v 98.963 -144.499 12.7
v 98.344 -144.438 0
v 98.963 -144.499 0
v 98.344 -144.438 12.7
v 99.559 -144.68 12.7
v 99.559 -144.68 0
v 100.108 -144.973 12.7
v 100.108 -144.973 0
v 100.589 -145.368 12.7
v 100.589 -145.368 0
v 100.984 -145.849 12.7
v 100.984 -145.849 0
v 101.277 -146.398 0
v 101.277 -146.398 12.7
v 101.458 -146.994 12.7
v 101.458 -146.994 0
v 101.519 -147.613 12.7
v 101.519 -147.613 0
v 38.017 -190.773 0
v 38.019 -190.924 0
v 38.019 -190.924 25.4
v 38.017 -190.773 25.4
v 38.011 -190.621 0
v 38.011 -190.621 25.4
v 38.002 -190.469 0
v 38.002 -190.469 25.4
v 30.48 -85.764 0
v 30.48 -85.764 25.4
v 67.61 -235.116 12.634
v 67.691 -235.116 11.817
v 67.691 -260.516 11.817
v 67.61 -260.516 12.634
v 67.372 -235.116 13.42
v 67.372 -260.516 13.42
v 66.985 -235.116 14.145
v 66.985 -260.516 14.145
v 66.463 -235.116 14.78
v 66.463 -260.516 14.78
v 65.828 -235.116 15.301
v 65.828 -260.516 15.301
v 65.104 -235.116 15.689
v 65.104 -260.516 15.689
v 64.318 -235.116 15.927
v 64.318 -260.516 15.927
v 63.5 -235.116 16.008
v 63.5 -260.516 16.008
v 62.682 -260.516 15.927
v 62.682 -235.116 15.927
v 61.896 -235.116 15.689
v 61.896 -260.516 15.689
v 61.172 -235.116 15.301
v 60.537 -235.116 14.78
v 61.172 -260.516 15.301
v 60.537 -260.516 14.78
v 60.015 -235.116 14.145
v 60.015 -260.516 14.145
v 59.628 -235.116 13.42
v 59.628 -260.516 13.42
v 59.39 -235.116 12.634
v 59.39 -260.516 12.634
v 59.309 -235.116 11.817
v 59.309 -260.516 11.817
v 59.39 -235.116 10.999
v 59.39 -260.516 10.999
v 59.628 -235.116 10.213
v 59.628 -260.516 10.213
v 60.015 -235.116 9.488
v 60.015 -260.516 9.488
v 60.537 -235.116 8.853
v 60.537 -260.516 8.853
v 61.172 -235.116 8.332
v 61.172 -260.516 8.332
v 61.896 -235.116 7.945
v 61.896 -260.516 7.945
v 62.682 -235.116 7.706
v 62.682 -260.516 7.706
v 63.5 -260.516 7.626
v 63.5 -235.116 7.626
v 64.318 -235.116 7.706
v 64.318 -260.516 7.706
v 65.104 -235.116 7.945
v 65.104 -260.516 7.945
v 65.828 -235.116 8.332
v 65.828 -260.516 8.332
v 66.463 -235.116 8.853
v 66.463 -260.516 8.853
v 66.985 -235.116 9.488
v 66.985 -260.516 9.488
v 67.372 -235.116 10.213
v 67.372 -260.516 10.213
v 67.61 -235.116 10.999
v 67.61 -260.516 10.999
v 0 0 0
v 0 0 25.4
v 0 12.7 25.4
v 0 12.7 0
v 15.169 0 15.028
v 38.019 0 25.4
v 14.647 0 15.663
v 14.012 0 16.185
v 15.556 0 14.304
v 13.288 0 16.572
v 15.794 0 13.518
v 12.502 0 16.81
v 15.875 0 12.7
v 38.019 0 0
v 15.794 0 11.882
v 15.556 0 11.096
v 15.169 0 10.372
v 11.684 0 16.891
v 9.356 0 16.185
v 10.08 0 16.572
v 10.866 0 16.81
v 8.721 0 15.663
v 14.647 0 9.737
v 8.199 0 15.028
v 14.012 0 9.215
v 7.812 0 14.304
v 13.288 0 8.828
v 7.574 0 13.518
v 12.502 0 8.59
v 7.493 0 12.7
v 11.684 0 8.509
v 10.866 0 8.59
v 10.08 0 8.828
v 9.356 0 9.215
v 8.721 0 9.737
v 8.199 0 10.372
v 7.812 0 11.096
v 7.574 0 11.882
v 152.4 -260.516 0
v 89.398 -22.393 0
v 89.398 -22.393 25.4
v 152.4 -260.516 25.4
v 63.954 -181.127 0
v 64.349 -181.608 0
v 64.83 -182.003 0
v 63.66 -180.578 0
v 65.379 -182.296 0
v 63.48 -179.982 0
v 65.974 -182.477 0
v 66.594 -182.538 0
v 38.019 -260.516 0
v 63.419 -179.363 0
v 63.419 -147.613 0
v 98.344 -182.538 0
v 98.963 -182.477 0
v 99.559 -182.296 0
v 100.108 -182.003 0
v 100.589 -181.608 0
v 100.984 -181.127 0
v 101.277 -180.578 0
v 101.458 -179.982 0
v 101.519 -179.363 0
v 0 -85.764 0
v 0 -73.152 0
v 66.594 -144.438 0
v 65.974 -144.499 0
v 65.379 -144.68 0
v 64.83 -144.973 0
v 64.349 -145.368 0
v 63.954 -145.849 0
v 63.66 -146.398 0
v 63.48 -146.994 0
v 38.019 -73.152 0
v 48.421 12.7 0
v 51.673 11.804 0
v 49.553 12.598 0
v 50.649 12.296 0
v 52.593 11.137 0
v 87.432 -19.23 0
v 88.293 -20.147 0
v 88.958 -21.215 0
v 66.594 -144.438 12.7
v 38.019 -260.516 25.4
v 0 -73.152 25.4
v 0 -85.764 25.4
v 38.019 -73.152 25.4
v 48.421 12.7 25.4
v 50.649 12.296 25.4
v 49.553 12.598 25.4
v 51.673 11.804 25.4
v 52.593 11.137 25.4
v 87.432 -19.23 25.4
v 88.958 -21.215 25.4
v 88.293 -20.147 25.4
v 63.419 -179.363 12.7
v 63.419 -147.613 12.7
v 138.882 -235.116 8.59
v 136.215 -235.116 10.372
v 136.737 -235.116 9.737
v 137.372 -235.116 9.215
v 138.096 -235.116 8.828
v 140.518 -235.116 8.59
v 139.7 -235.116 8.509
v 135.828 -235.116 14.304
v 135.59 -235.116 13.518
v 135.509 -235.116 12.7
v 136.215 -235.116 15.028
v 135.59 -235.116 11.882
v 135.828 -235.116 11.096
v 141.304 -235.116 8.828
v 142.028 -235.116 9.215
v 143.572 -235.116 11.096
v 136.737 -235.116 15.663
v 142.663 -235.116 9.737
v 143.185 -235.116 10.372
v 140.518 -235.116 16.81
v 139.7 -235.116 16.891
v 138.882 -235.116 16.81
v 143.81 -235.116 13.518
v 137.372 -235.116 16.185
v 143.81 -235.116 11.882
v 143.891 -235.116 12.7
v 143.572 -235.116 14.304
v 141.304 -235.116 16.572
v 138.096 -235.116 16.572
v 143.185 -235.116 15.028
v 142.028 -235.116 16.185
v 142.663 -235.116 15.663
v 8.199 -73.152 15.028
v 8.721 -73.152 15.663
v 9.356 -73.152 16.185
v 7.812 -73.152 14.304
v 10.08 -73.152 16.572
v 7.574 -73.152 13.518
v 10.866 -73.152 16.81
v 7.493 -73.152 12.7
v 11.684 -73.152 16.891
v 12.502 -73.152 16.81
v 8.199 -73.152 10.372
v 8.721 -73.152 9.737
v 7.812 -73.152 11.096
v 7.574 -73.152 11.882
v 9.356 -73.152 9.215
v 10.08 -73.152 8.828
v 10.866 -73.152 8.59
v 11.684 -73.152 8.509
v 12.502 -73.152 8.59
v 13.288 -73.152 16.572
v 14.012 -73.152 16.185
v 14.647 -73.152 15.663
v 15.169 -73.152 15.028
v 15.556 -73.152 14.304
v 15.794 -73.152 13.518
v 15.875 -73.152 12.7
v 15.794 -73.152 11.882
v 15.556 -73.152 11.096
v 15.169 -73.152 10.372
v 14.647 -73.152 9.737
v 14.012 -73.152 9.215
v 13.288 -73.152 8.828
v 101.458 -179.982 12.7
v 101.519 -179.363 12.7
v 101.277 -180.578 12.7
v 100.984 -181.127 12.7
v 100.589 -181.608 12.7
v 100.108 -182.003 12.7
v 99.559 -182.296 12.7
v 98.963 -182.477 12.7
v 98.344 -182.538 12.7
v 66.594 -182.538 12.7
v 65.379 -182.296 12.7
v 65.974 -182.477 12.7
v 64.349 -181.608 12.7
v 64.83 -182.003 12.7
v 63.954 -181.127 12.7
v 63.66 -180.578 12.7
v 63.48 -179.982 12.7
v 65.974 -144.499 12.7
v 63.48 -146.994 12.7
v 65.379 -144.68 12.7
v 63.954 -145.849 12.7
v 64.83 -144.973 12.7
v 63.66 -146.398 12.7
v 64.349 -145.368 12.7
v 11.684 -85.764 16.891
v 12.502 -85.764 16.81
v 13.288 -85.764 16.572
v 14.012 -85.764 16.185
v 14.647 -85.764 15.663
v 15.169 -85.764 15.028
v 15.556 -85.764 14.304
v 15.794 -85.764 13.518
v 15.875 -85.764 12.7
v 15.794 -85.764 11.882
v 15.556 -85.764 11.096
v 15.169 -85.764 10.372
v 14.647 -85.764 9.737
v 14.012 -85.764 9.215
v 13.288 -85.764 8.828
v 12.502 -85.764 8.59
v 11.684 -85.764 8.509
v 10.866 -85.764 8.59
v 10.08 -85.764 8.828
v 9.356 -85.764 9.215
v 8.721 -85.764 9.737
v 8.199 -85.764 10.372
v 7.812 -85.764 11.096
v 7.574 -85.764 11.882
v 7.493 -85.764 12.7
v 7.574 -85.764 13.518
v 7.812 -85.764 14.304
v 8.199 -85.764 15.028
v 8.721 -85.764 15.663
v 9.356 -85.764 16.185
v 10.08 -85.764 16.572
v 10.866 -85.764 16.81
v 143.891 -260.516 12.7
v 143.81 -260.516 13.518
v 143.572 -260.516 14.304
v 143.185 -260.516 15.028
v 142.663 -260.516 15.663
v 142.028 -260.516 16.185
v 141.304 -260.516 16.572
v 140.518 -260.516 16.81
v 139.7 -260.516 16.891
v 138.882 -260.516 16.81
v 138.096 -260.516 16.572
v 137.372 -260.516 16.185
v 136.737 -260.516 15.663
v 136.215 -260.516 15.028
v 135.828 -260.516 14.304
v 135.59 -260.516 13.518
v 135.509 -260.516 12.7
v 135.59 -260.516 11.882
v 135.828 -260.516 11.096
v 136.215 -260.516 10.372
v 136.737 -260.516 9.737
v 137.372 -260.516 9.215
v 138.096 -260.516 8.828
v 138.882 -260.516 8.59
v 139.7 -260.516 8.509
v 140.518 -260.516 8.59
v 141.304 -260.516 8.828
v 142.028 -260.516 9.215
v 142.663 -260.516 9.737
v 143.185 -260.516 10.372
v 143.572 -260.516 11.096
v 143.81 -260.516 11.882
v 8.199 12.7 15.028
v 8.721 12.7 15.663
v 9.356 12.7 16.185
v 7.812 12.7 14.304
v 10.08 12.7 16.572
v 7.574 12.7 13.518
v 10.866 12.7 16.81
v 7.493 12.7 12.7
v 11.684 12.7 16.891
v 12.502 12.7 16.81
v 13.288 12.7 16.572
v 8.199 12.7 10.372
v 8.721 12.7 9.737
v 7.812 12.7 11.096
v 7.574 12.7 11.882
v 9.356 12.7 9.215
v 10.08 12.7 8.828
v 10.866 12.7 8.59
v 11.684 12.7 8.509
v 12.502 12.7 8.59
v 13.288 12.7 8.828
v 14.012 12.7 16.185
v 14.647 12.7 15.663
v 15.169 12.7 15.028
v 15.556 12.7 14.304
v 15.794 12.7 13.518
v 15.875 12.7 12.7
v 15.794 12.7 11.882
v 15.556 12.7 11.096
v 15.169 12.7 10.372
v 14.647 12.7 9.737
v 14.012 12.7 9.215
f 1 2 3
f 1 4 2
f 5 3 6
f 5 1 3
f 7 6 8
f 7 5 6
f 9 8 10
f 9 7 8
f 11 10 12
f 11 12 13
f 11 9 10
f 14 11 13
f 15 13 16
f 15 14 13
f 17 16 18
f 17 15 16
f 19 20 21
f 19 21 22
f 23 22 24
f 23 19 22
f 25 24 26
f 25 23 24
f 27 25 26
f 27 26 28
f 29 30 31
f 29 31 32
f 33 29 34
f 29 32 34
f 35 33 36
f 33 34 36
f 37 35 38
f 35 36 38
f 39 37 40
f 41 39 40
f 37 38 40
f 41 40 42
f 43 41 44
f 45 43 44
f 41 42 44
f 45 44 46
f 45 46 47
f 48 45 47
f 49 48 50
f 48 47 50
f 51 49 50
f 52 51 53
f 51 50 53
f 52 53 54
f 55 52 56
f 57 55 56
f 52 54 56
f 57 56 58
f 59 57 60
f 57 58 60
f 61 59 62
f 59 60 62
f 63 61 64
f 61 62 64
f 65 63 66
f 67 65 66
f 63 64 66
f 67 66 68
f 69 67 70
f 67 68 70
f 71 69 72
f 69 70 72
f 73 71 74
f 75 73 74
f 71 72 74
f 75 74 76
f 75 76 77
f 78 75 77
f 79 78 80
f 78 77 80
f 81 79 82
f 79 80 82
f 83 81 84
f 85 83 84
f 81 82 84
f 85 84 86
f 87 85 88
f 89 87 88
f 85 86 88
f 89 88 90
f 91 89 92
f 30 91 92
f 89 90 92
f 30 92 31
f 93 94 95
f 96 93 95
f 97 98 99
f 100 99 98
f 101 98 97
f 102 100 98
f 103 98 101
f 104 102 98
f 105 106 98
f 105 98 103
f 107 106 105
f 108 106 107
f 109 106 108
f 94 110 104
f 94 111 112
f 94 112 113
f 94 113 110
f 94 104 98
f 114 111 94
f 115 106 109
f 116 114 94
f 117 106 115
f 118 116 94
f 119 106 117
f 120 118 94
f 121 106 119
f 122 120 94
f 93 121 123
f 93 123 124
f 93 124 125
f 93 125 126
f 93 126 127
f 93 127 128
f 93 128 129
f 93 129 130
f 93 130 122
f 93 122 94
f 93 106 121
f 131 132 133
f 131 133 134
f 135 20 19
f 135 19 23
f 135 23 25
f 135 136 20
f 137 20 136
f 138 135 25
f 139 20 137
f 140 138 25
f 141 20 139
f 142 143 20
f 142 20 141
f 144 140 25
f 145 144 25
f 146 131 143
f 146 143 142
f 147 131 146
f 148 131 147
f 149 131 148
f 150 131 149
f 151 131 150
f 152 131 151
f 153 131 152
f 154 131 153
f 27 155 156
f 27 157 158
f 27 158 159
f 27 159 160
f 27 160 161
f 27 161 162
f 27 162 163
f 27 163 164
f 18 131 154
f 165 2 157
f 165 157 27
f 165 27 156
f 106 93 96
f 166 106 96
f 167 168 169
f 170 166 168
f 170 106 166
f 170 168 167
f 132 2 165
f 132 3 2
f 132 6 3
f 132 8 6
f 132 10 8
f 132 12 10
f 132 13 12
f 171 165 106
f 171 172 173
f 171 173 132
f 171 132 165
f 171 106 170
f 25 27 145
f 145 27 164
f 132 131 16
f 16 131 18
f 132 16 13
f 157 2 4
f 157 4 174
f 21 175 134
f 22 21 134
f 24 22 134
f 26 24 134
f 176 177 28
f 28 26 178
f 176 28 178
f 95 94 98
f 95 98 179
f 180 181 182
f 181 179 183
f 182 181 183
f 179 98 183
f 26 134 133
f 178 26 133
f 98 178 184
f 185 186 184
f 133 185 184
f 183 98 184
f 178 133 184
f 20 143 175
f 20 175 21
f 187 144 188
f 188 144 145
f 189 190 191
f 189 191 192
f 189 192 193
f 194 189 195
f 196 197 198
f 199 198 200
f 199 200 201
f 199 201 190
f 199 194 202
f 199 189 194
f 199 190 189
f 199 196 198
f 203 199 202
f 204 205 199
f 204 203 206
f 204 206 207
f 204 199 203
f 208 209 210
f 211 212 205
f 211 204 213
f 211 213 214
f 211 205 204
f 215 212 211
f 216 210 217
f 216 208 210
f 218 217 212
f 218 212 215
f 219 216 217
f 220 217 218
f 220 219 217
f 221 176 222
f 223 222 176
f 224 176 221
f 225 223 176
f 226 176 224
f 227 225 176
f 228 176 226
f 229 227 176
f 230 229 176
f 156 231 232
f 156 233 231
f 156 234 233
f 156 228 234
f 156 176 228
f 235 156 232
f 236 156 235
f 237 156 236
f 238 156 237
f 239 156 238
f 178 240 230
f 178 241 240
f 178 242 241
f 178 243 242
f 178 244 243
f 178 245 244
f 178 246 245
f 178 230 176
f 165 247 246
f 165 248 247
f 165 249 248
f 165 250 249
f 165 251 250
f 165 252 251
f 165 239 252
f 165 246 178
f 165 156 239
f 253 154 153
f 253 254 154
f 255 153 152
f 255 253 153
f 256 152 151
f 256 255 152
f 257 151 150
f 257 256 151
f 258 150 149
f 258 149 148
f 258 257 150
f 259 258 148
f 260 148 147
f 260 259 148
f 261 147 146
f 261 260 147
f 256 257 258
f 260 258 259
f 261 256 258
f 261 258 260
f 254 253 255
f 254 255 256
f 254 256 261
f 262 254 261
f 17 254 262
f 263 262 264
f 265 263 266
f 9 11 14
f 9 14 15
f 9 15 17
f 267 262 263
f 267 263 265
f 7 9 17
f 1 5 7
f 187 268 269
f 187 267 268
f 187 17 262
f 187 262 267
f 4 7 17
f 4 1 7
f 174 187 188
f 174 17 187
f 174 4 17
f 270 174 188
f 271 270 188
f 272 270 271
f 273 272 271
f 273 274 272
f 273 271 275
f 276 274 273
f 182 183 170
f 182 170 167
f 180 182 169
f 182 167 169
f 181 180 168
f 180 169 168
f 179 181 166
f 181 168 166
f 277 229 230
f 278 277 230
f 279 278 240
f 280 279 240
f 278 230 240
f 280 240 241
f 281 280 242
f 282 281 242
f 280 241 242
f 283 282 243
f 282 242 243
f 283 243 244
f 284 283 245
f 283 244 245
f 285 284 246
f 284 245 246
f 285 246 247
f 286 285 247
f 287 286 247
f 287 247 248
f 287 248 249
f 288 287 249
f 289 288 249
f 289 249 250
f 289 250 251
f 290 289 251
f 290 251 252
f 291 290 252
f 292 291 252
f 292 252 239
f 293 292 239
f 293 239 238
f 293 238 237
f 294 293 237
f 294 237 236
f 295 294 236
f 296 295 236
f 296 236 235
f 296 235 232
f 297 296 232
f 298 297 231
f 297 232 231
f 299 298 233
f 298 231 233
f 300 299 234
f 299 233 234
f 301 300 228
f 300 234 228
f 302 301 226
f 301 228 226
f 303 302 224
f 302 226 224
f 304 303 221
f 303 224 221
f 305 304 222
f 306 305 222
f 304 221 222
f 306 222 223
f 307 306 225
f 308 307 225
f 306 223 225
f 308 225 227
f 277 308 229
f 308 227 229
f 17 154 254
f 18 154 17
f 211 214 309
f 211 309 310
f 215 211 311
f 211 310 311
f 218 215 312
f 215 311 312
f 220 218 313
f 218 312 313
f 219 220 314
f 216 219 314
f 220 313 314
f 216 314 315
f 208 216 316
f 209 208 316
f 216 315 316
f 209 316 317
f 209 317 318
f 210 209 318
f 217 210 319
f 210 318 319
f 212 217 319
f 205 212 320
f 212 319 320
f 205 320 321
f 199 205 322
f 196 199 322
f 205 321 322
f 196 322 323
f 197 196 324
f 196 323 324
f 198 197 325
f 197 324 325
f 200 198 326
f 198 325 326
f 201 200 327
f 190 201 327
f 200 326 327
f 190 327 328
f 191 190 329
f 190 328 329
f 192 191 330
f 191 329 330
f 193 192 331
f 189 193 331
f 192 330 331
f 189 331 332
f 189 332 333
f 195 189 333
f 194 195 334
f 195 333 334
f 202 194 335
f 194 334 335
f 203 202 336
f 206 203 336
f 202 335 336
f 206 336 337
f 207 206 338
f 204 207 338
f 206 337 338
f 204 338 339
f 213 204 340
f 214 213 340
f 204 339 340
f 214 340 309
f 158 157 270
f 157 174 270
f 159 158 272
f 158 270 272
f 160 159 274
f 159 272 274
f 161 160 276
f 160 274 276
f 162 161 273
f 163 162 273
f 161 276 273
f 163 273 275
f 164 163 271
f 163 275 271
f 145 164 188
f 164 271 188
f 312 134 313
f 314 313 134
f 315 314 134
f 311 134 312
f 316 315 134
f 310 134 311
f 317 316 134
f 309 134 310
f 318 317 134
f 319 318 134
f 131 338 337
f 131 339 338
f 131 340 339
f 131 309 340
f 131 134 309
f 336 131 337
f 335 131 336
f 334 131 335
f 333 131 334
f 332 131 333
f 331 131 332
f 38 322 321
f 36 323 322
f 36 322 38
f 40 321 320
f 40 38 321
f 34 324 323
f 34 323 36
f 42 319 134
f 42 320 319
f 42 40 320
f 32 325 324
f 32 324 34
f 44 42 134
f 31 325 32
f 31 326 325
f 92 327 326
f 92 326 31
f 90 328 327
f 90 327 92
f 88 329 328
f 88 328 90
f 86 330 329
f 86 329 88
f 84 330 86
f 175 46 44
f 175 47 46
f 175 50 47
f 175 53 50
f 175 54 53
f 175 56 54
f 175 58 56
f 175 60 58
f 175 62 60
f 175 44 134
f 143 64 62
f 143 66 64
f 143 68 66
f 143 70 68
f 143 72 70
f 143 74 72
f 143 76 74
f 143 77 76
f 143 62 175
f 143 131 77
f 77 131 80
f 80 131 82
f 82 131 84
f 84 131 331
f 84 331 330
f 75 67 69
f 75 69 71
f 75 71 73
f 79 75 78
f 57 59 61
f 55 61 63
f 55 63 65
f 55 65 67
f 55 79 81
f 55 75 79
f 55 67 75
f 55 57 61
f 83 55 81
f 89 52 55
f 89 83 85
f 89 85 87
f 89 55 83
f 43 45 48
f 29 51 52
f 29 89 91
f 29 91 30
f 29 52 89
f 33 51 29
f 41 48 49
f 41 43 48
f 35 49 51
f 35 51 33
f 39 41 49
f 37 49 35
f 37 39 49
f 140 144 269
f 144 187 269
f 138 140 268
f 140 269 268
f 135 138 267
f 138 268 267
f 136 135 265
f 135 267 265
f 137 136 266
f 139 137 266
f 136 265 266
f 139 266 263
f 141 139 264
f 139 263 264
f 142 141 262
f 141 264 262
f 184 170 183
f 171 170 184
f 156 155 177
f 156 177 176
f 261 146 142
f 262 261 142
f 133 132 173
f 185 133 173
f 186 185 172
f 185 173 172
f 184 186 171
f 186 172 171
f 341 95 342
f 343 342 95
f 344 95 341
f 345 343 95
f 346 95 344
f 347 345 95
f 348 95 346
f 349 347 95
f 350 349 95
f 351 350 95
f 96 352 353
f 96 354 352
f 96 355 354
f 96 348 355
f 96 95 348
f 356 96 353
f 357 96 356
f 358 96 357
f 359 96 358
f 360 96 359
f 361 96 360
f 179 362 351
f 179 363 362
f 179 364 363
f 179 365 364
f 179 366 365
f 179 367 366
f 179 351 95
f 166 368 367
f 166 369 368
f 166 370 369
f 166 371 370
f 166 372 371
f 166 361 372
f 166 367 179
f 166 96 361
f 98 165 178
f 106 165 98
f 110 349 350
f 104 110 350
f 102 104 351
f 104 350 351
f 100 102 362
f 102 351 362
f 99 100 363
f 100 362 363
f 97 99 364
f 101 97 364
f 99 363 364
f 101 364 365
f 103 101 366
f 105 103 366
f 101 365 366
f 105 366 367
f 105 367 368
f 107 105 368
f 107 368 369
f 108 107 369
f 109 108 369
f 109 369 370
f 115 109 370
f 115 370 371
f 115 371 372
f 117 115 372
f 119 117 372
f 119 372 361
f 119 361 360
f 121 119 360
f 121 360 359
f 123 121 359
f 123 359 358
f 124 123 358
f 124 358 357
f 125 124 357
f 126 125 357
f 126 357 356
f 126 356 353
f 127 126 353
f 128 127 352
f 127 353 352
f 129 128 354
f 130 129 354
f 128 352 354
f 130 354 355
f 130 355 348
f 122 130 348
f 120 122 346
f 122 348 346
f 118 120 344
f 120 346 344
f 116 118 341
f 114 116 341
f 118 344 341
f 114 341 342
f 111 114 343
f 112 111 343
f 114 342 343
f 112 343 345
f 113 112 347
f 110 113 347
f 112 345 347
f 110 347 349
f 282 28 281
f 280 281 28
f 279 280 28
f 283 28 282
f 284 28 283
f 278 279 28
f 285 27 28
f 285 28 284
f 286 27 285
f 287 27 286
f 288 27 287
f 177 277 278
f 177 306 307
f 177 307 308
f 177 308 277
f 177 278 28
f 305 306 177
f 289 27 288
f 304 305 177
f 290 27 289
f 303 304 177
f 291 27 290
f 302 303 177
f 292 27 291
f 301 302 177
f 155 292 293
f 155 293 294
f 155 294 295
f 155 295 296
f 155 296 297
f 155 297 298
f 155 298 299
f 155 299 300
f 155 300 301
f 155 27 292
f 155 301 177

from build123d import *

# Parameters (mm, degrees)
BOSS_EXTRUDE1_DEPTH = 25.4
SKETCH2_W           = 38.1
SKETCH2_H           = 38.1
CUT_EXTRUDE1_DEPTH  = 12.7
SKETCH3_R           = 4.191
CUT_EXTRUDE2_DEPTH  = 314.875552812
SKETCH4_R           = 4.191
CUT_EXTRUDE3_DEPTH  = 25.4
FILLET1_R           = 6.35
FILLET2_R           = 3.175


with BuildPart() as part:
    # Sketch1 → Boss-Extrude1 (new body)
    with BuildSketch(Plane.XY):
        Polygon((0, 0), (0, 12.7), (50.8, 12.7), (88.9, -20.510228633), (152.4, -260.515926793), (38.018659419, -260.515926793), (38.018659419, -190.696503564), (30.48, -85.763926793), (0, -85.763926793), (0, -73.152260366), (38.018659419, -73.152260366), (38.018659419, 0), align=None)
    extrude(amount=BOSS_EXTRUDE1_DEPTH)

    # Sketch2 → Cut-Extrude1 (cut)
    with BuildSketch(Plane(origin=(0, 0, 0), x_dir=(-1, 0, 0), z_dir=(0, 0, -1))):
        with Locations((-82.468659419, -163.487926793)):
            Rectangle(SKETCH2_W, SKETCH2_H)
    extrude(amount=-CUT_EXTRUDE1_DEPTH, mode=Mode.SUBTRACT)

    # Sketch3 → Cut-Extrude2 (cut, through all)
    with BuildSketch(Plane(origin=(0, 12.7, 0), x_dir=(1, 0, 0), z_dir=(0, 1, 0))):
        with Locations(Location((11.684, -12.7, 0), (0, 0, 270))):
            Circle(SKETCH3_R)
    extrude(amount=-CUT_EXTRUDE2_DEPTH, mode=Mode.SUBTRACT)

    # Sketch4 → Cut-Extrude3 (cut)
    with BuildSketch(Plane(origin=(0, -260.515926793, 0), x_dir=(-1, 0, 0), z_dir=(0, -1, 0))):
        with Locations(Location((-139.7, -12.7, 0), (0, 0, 180))):
            Circle(SKETCH4_R)
        with Locations(Location((-63.5, -11.81655653, 0), (0, 0, 180))):
            Circle(SKETCH4_R)
    extrude(amount=-CUT_EXTRUDE3_DEPTH, mode=Mode.SUBTRACT)

    # Fillet1
    # the kernel refuses this fillet: 6.35 mm, written as the material it adds along each edge
    with BuildSketch(Plane(origin=(38.018659419, -190.696503564, 0), x_dir=(0, -1, 0), z_dir=(0, 0, 1))) as fillet1_piece_1:
        with BuildLine():
            CenterArc((FILLET1_R * 0.0358752122725, -FILLET1_R), FILLET1_R, 90, 4.109234206)
            Line((-FILLET1_R * 0.0357829859603, -FILLET1_R * 0.00257075307266), (0, 0))
            Line((0, 0), (FILLET1_R * 0.0358752122725, 0))
        make_face()
    extrude(amount=25.4)
    # the kernel refuses this fillet: 6.35 mm, written as the material it takes off along each edge
    with BuildSketch(Plane(origin=(50.8, 12.7, -5.947635314), x_dir=(-1, 0, 0), z_dir=(0, 0, 1))) as fillet1_2_piece_1:
        with BuildLine():
            CenterArc((FILLET1_R * 0.374654193004, FILLET1_R), FILLET1_R, 228.922654606, 41.077345394)
            Line((-FILLET1_R * 0.282423044355, FILLET1_R * 0.246176742103), (0, 0))
            Line((0, 0), (FILLET1_R * 0.374654193004, 0))
        make_face()
    extrude(amount=37.295270628, mode=Mode.SUBTRACT)
    with BuildSketch(Plane(origin=(88.9, -20.510228633, -4.869092834), x_dir=(-0.7538232578965339, 0.6570772373581782, 0), z_dir=(0, 0, 1))) as fillet1_2_piece_2:
        with BuildLine():
            CenterArc((FILLET1_R * 0.306714509228, FILLET1_R), FILLET1_R, 235.896927034, 34.103072966)
            Line((-FILLET1_R * 0.253968896194, FILLET1_R * 0.171969735526), (0, 0))
            Line((0, 0), (FILLET1_R * 0.306714509228, 0))
        make_face()
    extrude(amount=35.138185668, mode=Mode.SUBTRACT)

    # Fillet2
    fillet2_edges = [part.edges().sort_by_distance(p)[0] for p in [
        (101.518659419, -182.537926793, 6.35),
        (101.518659419, -144.437926793, 6.35),
        (63.418659419, -144.437926793, 6.35),
        (63.418659419, -182.537926793, 6.35),
    ]]
    fillet(fillet2_edges, radius=FILLET2_R)


solid = part.part
